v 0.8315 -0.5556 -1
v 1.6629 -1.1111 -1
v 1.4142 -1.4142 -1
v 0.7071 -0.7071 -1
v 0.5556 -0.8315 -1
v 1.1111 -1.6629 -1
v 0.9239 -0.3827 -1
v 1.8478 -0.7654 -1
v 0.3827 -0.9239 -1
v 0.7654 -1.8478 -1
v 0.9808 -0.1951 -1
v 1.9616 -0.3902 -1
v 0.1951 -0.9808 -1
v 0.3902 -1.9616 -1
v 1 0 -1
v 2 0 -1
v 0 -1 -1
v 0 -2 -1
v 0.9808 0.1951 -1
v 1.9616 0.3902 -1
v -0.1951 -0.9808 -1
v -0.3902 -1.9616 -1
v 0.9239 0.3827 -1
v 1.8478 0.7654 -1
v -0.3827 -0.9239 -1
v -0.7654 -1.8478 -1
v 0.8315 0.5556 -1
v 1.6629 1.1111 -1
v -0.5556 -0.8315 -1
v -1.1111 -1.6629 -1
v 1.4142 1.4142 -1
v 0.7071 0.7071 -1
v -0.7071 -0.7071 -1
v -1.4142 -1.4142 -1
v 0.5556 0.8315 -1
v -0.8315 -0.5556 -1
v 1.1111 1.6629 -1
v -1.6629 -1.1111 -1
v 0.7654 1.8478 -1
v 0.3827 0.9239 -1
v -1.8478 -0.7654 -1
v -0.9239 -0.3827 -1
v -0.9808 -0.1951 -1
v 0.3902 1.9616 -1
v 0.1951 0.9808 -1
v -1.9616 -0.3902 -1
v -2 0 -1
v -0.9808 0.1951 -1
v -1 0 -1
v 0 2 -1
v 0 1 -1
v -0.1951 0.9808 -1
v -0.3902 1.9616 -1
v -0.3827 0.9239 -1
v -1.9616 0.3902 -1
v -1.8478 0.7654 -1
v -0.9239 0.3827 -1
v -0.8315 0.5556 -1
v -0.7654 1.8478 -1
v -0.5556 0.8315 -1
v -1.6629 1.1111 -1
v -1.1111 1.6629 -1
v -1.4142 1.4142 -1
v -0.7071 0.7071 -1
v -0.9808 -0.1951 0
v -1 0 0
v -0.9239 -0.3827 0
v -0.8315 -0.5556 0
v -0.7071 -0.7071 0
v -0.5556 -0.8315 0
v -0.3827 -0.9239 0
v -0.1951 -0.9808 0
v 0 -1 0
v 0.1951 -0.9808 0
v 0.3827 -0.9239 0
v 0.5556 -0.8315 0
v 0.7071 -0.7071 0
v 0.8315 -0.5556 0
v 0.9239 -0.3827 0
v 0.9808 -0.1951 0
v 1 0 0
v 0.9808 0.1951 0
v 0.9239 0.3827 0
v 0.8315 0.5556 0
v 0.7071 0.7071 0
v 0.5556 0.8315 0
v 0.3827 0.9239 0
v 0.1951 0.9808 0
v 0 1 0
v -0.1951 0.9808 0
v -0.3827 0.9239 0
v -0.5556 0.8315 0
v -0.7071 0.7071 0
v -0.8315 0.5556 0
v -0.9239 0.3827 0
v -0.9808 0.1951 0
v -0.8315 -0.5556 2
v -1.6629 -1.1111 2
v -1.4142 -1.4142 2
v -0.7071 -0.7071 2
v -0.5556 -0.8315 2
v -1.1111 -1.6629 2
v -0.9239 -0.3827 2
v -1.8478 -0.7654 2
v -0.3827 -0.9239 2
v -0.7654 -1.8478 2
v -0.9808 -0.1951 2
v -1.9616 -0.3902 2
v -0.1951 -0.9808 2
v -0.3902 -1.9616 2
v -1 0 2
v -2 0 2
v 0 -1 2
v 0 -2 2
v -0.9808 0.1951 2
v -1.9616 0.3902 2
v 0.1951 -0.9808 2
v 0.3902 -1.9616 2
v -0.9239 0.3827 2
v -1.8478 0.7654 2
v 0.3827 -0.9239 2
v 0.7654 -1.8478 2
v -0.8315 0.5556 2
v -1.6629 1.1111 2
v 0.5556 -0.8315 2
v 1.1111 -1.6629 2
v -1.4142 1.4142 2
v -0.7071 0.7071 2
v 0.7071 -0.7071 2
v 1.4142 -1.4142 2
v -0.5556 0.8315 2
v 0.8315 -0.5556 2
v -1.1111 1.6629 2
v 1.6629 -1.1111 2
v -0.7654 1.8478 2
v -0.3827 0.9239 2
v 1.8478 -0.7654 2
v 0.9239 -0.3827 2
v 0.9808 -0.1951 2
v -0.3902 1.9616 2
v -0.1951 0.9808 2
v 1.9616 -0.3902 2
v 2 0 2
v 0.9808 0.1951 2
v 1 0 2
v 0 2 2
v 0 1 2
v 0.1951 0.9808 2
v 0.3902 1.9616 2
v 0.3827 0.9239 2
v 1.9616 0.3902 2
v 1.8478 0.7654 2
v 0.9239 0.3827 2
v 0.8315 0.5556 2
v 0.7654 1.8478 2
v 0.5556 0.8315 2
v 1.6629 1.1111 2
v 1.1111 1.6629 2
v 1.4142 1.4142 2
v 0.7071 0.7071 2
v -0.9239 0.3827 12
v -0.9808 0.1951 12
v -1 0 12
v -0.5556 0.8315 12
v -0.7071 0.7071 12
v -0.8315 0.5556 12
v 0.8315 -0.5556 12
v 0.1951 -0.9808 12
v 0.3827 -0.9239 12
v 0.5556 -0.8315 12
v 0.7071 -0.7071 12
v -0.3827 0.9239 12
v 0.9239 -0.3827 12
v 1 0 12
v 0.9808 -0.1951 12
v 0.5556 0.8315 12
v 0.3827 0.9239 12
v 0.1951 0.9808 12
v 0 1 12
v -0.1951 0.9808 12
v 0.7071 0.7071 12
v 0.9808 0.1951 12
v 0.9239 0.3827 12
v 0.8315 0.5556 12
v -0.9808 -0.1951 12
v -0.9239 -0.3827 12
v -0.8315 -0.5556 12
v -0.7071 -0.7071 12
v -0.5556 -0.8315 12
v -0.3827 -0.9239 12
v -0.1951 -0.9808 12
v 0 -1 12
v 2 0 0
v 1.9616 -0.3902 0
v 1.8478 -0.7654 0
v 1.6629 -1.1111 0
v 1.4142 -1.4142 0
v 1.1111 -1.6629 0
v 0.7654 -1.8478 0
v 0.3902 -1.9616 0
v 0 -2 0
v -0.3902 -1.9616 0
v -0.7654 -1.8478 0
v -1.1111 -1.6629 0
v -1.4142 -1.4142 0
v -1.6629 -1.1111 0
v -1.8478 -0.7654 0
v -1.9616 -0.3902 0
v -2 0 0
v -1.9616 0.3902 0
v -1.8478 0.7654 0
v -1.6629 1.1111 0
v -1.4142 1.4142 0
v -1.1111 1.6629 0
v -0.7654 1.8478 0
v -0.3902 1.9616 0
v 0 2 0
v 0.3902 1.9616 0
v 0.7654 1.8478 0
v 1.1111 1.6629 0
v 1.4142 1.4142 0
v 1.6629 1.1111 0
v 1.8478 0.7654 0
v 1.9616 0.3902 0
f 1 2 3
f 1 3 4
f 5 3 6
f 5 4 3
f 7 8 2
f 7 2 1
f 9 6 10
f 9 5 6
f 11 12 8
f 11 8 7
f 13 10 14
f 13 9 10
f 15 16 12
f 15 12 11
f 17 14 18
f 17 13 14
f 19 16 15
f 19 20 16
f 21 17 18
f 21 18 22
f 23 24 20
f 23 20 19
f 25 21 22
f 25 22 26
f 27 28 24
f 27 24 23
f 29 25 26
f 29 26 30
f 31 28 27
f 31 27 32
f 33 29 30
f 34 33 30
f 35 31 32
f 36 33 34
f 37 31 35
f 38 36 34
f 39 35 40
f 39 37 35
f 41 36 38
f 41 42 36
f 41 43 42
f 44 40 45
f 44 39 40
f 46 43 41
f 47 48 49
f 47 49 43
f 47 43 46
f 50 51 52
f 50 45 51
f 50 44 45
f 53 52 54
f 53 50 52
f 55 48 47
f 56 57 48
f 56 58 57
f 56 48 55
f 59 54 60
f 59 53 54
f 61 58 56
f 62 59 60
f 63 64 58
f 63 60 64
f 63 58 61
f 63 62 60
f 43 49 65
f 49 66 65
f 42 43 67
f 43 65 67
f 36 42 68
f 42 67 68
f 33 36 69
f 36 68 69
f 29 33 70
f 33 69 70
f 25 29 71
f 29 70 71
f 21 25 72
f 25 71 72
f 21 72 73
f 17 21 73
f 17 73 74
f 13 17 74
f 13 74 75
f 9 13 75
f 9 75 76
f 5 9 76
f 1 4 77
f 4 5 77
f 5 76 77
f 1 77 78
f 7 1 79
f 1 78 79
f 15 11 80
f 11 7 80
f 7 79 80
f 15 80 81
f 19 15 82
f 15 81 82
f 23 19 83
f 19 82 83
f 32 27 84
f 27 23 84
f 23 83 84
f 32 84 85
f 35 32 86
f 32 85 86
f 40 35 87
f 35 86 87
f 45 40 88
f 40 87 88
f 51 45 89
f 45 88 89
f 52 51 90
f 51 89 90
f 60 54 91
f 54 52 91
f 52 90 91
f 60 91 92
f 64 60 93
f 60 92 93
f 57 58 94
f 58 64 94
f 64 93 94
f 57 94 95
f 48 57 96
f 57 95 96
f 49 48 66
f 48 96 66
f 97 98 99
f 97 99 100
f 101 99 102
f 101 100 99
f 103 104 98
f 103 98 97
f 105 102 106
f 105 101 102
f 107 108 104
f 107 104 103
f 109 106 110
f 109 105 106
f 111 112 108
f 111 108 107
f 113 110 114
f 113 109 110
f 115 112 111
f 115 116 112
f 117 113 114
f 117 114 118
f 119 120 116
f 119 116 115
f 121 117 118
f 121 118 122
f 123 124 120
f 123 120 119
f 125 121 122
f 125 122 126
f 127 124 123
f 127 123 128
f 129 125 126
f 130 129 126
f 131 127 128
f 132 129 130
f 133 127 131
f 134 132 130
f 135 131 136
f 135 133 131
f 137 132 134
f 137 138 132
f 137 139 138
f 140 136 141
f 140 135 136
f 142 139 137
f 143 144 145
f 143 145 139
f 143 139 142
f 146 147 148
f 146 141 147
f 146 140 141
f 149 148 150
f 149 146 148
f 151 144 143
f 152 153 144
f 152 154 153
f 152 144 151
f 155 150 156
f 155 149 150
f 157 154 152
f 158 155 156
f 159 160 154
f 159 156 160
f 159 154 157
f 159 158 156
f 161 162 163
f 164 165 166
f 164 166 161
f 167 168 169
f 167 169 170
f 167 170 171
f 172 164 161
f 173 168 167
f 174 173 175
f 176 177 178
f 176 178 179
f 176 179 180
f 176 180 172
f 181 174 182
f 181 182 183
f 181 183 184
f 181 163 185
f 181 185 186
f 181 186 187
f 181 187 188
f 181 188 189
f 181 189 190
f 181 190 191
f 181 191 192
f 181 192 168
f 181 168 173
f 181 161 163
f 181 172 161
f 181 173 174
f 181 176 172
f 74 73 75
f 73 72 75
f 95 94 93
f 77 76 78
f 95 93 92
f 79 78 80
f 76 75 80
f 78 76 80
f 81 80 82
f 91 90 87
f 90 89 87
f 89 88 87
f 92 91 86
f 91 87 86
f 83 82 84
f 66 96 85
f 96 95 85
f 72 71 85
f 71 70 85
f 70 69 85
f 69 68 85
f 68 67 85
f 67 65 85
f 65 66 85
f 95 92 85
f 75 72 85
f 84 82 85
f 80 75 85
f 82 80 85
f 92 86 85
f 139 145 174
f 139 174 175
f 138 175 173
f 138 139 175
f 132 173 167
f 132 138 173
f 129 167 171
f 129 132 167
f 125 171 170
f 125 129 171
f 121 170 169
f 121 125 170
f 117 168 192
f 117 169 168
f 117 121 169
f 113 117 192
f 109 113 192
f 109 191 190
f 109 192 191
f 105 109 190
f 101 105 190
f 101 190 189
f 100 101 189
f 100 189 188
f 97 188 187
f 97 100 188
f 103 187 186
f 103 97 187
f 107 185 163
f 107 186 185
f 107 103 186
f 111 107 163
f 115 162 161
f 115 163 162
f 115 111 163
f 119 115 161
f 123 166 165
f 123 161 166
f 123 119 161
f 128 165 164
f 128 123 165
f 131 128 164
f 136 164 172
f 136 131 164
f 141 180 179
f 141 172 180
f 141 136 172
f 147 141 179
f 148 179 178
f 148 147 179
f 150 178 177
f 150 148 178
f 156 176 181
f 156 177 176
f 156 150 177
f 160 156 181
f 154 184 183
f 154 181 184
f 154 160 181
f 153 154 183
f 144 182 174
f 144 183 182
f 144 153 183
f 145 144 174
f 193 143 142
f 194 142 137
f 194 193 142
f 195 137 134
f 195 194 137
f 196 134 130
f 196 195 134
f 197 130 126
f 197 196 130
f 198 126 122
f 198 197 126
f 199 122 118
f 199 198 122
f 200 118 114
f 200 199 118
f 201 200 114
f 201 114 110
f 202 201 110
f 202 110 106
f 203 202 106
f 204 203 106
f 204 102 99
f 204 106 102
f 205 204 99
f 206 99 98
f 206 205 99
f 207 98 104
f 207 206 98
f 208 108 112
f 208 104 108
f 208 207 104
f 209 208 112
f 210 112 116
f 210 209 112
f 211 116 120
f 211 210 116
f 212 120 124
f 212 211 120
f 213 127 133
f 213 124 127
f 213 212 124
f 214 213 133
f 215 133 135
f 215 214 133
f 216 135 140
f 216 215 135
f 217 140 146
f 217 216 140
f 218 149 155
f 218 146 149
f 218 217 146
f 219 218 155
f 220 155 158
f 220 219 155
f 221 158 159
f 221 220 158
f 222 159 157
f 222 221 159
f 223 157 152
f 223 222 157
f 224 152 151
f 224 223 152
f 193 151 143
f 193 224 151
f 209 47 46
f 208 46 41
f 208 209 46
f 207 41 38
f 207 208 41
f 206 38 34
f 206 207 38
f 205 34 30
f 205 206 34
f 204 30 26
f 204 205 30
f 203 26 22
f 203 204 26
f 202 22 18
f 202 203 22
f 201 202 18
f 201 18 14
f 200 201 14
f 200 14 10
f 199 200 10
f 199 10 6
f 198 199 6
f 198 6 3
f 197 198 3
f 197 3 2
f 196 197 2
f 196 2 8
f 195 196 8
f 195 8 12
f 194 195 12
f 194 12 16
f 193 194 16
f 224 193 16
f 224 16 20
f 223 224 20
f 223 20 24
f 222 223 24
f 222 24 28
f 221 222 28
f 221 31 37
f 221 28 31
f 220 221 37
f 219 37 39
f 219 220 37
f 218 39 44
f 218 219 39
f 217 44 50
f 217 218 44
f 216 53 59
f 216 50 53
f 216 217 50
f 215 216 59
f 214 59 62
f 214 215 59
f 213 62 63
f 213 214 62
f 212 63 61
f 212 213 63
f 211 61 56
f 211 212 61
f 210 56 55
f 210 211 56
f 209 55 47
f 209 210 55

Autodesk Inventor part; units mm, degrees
ref_plane "YZ Plane" through (0, 0, 0) normal (1, 0, 0) x (0, 1, 0)
ref_plane "XZ Plane" through (0, 0, 0) normal (0, 1, 0) x (-1, 0, 0)
ref_plane "XY Plane" through (0, 0, 0) normal (0, 0, 1) x (1, 0, 0)
sketch "Sketch1" plane through (0, 0, 0) normal (0, 0, 1) x (1, 0, 0)
  circle A0 centre (0, 0) radius 2
  dimension "d0" = 2
extrude "Extrusion1" add sketch "Sketch1" along normal blind 2
sketch "Sketch2" plane through (0, 0, 2) normal (0, 0, 1) x (1, 0, 0)
  circle A0 centre (0, 0) radius 1
  dimension "d3" = 1
extrude "Extrusion2" add sketch "Sketch2" along normal blind 10
sketch "Sketch3" plane through (0, 0, 0) normal (0, 0, -1) x (-1, 0, 0)
  circle A0 centre (0, 0) radius 2
  circle A1 centre (0, 0) radius 1
  dimension "d6" = 2
  dimension "d7" = 1
extrude "Extrusion3" add sketch "Sketch3" along normal blind 1
properties part number "eje"
